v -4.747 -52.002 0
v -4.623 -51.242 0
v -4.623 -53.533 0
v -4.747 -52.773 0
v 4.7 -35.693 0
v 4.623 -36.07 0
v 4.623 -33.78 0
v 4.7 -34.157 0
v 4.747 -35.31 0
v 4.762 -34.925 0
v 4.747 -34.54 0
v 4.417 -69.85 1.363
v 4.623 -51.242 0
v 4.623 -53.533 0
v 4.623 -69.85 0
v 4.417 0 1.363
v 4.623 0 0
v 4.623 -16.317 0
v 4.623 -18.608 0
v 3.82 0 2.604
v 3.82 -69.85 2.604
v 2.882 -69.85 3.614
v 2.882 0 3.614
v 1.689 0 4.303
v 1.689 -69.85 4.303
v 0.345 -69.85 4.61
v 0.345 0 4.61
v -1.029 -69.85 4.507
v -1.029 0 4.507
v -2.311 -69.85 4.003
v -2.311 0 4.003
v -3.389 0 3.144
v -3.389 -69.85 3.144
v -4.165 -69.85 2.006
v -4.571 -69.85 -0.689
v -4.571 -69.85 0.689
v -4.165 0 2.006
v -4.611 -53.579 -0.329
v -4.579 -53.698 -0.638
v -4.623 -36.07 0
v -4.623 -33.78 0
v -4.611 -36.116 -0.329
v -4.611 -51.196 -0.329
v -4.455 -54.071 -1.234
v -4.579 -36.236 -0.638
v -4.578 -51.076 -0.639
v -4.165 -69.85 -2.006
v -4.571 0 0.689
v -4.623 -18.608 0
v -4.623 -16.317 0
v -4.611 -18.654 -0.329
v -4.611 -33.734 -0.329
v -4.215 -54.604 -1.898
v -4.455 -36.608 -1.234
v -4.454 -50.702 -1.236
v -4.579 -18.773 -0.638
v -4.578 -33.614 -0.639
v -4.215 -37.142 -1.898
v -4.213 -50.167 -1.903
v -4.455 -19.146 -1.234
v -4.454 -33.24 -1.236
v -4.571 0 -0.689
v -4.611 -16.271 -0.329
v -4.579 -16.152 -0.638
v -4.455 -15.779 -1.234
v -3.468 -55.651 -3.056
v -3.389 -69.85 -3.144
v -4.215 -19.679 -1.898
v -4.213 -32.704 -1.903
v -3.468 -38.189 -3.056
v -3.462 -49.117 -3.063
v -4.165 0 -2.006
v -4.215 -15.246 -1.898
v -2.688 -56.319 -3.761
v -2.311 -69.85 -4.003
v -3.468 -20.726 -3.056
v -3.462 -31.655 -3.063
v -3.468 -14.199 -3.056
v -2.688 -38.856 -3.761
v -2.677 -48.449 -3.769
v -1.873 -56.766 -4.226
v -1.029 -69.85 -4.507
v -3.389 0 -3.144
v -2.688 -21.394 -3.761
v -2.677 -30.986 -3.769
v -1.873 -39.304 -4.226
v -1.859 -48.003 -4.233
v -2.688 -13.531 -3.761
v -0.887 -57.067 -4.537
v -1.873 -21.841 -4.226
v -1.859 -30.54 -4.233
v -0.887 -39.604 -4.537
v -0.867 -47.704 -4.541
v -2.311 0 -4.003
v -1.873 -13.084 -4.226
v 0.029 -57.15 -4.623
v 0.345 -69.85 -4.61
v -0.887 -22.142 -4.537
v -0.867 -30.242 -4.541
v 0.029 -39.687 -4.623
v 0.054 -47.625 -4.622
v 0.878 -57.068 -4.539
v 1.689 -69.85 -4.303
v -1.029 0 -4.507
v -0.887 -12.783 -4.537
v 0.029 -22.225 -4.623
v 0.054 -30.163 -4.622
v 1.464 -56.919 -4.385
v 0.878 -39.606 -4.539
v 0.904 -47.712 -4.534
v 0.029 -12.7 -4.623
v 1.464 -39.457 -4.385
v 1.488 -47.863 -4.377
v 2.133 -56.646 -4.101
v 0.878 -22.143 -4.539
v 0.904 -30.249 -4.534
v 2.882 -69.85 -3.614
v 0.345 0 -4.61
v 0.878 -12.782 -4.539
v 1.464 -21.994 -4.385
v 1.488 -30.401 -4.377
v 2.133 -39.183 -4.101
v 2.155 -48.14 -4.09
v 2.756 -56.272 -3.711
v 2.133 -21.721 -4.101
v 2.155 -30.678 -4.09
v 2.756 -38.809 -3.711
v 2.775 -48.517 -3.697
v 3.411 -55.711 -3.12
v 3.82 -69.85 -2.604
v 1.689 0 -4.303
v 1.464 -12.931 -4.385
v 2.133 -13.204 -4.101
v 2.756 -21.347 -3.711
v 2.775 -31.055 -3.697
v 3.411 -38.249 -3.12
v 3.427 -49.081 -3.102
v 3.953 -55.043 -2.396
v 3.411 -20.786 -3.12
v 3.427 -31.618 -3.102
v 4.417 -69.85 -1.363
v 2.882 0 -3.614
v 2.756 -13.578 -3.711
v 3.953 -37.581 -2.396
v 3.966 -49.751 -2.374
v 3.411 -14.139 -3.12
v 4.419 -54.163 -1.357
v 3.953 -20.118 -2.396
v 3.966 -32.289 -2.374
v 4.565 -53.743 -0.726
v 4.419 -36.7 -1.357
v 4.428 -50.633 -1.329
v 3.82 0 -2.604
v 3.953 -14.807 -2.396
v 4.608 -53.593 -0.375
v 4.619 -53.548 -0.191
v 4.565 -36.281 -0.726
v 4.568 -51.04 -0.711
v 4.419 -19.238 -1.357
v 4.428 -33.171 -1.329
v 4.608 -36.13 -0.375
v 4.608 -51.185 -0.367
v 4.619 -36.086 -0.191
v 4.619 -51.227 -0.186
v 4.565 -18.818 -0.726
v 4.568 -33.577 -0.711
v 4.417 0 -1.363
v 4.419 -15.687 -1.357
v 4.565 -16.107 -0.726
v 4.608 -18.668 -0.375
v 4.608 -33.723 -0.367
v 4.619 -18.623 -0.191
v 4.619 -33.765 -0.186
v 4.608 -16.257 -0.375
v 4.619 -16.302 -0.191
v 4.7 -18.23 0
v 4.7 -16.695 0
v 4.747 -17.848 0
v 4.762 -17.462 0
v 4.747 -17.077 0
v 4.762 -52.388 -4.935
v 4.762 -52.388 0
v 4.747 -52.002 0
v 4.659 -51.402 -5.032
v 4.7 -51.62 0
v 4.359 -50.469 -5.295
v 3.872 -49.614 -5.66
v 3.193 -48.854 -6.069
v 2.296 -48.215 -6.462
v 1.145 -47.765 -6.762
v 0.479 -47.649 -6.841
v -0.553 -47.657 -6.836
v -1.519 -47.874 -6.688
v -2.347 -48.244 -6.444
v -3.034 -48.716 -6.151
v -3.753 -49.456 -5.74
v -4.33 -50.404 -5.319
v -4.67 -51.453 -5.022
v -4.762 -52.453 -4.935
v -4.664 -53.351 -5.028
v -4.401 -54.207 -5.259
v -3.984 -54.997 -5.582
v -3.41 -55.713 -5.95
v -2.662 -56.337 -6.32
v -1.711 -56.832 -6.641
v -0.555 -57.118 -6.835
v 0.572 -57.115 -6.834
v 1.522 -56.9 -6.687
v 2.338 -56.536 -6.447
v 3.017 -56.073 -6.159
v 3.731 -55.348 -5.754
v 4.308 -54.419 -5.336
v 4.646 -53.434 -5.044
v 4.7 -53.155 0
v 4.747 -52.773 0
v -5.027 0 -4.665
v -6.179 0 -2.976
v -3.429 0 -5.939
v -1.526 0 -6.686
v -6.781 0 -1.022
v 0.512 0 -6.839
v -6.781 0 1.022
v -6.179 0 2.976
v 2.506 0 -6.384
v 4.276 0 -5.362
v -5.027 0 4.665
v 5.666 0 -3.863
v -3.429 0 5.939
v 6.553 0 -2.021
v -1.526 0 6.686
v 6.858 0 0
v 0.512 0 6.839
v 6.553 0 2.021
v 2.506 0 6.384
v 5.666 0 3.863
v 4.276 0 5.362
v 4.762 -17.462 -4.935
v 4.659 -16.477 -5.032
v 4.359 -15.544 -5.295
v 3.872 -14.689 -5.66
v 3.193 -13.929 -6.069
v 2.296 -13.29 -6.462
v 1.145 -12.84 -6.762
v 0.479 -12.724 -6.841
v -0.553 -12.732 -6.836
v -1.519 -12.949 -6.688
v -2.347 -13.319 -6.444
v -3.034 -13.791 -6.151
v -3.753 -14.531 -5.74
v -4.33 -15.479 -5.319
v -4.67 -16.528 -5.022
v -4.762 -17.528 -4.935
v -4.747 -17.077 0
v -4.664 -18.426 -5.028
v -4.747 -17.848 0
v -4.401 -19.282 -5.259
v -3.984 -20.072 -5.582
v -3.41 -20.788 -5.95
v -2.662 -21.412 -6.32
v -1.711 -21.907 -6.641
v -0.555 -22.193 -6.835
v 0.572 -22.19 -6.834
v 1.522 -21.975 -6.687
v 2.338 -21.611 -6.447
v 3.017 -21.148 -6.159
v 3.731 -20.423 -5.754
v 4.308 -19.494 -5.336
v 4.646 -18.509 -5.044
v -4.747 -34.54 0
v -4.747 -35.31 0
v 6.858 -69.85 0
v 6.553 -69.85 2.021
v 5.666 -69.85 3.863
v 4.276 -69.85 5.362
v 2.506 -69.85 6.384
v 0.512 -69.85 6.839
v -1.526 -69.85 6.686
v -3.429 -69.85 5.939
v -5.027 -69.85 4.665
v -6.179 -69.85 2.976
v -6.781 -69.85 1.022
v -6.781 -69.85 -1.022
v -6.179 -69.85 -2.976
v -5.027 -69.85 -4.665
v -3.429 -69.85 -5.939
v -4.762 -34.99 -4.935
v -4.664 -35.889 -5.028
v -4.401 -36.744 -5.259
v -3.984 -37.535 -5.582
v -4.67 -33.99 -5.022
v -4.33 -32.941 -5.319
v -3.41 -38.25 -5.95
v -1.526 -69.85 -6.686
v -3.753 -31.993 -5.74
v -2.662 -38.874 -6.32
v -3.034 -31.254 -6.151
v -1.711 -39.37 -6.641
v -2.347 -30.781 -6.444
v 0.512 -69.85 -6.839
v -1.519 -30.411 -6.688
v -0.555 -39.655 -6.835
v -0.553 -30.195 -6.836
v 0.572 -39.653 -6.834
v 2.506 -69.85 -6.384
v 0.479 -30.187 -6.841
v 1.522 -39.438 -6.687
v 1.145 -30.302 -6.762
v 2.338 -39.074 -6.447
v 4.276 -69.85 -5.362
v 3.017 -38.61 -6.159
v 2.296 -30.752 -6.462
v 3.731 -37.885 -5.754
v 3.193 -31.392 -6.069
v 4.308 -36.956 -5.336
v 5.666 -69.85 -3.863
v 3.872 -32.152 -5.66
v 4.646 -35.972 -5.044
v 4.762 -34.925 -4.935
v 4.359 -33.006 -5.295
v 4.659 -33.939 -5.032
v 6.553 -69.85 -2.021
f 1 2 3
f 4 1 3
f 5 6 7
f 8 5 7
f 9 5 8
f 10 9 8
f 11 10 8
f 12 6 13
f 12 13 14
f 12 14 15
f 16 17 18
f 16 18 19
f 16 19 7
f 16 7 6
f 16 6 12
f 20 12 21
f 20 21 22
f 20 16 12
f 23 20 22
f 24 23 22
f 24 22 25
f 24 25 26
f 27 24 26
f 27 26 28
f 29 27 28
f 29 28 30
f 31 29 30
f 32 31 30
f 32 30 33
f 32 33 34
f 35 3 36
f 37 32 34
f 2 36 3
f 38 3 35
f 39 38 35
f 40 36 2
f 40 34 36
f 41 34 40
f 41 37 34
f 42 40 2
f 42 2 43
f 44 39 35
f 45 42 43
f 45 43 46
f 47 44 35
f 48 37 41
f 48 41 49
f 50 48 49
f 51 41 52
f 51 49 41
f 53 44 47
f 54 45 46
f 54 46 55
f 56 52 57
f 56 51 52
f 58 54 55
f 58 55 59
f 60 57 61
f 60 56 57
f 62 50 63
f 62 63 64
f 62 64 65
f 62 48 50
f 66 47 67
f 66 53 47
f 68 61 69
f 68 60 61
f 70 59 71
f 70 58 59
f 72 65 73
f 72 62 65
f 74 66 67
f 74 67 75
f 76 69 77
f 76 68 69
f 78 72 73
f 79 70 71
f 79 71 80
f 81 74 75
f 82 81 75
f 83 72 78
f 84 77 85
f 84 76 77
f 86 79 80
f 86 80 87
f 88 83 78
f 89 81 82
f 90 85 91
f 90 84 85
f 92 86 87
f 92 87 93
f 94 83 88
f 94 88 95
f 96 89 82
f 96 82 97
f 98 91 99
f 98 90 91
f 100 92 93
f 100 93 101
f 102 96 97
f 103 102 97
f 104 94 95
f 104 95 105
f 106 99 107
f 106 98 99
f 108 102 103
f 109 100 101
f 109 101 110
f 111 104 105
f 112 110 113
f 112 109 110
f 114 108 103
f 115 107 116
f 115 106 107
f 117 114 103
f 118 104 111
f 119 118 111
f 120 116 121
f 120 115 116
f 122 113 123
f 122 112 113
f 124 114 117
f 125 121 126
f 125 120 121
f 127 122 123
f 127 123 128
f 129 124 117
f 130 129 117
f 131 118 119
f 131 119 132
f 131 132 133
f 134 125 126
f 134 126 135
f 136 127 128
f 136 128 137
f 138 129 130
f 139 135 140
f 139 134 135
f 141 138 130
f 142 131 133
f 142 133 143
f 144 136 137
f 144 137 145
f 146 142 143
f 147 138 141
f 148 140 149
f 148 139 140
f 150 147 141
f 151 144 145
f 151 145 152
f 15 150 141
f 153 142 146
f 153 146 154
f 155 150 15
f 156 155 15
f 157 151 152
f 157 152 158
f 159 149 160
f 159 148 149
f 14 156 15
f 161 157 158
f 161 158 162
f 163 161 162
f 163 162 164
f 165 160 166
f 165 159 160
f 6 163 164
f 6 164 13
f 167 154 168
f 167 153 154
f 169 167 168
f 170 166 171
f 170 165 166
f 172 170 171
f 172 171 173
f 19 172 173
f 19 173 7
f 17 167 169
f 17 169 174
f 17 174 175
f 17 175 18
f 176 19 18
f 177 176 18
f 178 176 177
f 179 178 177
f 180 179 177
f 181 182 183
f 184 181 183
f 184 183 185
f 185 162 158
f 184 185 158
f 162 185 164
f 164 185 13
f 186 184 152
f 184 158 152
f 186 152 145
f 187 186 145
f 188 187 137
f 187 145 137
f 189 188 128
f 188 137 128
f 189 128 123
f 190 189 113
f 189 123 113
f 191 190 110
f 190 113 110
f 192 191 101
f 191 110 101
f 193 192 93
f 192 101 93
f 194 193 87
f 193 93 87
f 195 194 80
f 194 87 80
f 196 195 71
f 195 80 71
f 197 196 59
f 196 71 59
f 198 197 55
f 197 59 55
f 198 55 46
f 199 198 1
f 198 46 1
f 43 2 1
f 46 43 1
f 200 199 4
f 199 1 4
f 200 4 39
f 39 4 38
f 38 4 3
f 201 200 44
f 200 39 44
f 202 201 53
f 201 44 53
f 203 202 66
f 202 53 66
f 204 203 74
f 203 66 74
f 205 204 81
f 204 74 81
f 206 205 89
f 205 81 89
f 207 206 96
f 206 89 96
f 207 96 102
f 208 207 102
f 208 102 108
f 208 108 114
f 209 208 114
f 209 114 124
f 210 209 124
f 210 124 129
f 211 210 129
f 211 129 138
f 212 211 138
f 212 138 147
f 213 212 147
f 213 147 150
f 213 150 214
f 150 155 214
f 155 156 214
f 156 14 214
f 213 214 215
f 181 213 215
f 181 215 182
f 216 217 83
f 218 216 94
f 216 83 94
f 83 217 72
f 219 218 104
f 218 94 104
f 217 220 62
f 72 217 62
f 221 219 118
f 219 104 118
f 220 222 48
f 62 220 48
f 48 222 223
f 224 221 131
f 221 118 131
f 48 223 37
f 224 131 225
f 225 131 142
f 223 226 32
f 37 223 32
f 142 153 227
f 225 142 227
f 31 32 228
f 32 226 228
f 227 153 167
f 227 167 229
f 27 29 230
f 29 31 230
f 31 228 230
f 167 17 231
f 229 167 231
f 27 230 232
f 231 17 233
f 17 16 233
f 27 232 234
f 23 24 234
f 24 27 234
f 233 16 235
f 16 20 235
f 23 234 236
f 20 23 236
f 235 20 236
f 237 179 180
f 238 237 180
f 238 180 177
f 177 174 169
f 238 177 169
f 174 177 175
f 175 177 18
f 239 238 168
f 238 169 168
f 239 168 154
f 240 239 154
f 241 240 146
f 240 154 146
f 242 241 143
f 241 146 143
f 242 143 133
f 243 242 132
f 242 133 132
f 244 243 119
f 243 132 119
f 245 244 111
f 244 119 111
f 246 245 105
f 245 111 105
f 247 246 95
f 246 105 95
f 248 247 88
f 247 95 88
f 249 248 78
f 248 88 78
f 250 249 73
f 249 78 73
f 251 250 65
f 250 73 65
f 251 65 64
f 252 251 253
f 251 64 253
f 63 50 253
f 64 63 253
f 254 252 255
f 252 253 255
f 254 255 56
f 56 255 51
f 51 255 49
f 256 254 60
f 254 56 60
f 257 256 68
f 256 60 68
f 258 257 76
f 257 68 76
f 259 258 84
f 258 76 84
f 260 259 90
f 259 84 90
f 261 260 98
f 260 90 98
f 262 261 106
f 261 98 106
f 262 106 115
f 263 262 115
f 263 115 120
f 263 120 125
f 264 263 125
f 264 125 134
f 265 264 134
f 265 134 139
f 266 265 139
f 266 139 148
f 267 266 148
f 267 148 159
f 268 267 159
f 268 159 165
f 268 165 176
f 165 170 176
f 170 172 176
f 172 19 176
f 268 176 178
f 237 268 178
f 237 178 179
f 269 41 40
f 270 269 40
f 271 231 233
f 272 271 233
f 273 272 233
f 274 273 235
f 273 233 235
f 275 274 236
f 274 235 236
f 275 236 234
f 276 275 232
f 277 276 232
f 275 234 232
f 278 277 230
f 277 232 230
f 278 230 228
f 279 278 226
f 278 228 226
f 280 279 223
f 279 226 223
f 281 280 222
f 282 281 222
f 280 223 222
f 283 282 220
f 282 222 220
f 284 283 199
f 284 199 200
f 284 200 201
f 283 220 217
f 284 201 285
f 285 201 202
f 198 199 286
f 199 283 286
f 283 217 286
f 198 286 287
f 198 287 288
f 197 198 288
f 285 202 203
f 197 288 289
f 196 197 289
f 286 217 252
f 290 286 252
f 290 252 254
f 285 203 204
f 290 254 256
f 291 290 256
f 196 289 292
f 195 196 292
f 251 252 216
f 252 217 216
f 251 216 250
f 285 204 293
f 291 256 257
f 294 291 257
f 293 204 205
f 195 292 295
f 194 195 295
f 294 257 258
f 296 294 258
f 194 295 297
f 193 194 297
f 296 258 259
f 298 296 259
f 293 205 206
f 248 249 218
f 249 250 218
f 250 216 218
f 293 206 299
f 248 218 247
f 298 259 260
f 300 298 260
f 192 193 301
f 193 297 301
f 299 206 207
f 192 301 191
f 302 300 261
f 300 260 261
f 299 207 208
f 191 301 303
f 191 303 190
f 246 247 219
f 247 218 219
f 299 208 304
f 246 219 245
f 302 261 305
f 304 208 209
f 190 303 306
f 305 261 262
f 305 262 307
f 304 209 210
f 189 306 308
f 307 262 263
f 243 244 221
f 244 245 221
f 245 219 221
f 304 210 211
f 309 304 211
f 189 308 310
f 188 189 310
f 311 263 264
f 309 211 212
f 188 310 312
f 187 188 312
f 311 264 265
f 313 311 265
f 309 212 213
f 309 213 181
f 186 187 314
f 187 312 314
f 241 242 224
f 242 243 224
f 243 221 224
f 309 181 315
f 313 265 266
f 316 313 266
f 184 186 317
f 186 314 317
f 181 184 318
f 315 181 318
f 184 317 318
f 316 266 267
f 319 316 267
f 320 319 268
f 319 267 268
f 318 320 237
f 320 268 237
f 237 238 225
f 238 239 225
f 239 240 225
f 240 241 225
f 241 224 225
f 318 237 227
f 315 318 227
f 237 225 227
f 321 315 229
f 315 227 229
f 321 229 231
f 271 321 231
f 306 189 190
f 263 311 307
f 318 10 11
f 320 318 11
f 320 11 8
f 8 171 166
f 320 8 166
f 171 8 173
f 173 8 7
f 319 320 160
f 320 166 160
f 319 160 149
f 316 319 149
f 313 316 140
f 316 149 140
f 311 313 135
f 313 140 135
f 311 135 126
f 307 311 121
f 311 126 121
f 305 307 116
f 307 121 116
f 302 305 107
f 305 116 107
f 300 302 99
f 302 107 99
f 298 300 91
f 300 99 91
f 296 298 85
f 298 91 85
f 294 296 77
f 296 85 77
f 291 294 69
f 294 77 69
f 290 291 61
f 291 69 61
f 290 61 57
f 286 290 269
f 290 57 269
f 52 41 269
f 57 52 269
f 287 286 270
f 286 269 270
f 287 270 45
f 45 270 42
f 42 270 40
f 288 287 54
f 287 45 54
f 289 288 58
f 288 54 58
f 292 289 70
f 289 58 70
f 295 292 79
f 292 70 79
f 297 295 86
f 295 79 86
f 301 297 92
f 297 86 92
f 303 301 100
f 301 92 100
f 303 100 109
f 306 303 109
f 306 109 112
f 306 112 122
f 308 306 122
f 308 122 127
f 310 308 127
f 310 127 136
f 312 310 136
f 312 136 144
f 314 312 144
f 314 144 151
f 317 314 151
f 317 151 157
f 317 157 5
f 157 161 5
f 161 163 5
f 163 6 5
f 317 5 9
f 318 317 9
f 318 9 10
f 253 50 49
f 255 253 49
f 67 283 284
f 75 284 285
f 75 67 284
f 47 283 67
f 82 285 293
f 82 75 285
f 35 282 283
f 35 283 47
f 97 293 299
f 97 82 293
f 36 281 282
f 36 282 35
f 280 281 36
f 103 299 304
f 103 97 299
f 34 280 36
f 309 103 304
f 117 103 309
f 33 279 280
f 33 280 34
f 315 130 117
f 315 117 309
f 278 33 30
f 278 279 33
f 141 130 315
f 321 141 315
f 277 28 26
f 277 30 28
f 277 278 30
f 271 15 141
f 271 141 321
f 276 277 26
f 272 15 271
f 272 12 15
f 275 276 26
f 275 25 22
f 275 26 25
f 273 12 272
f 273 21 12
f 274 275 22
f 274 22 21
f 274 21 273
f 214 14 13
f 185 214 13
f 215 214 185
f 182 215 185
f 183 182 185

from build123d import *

# Parameters (mm, degrees)
F0_R     = 6.858
F0_R_2   = 4.6228
F1_DEPTH = 69.85
F2_R     = 4.7625
F3_DEPTH = 25.4


with BuildPart() as f1:
    # F0 (on Front) → F1 (new body)
    with BuildSketch(Plane.XZ):
        Circle(F0_R)
        Circle(F0_R_2, mode=Mode.SUBTRACT)
    extrude(amount=F1_DEPTH)

    # F2 (on Top) → F3 (cut)
    with BuildSketch(Plane.XY):
        with Locations((0, -17.4625)):
            Circle(F2_R)
        with Locations((0, -34.925)):
            Circle(F2_R)
        with Locations((0, -52.3875)):
            Circle(F2_R)
    extrude(amount=-F3_DEPTH, mode=Mode.SUBTRACT)


solid = f1.part
